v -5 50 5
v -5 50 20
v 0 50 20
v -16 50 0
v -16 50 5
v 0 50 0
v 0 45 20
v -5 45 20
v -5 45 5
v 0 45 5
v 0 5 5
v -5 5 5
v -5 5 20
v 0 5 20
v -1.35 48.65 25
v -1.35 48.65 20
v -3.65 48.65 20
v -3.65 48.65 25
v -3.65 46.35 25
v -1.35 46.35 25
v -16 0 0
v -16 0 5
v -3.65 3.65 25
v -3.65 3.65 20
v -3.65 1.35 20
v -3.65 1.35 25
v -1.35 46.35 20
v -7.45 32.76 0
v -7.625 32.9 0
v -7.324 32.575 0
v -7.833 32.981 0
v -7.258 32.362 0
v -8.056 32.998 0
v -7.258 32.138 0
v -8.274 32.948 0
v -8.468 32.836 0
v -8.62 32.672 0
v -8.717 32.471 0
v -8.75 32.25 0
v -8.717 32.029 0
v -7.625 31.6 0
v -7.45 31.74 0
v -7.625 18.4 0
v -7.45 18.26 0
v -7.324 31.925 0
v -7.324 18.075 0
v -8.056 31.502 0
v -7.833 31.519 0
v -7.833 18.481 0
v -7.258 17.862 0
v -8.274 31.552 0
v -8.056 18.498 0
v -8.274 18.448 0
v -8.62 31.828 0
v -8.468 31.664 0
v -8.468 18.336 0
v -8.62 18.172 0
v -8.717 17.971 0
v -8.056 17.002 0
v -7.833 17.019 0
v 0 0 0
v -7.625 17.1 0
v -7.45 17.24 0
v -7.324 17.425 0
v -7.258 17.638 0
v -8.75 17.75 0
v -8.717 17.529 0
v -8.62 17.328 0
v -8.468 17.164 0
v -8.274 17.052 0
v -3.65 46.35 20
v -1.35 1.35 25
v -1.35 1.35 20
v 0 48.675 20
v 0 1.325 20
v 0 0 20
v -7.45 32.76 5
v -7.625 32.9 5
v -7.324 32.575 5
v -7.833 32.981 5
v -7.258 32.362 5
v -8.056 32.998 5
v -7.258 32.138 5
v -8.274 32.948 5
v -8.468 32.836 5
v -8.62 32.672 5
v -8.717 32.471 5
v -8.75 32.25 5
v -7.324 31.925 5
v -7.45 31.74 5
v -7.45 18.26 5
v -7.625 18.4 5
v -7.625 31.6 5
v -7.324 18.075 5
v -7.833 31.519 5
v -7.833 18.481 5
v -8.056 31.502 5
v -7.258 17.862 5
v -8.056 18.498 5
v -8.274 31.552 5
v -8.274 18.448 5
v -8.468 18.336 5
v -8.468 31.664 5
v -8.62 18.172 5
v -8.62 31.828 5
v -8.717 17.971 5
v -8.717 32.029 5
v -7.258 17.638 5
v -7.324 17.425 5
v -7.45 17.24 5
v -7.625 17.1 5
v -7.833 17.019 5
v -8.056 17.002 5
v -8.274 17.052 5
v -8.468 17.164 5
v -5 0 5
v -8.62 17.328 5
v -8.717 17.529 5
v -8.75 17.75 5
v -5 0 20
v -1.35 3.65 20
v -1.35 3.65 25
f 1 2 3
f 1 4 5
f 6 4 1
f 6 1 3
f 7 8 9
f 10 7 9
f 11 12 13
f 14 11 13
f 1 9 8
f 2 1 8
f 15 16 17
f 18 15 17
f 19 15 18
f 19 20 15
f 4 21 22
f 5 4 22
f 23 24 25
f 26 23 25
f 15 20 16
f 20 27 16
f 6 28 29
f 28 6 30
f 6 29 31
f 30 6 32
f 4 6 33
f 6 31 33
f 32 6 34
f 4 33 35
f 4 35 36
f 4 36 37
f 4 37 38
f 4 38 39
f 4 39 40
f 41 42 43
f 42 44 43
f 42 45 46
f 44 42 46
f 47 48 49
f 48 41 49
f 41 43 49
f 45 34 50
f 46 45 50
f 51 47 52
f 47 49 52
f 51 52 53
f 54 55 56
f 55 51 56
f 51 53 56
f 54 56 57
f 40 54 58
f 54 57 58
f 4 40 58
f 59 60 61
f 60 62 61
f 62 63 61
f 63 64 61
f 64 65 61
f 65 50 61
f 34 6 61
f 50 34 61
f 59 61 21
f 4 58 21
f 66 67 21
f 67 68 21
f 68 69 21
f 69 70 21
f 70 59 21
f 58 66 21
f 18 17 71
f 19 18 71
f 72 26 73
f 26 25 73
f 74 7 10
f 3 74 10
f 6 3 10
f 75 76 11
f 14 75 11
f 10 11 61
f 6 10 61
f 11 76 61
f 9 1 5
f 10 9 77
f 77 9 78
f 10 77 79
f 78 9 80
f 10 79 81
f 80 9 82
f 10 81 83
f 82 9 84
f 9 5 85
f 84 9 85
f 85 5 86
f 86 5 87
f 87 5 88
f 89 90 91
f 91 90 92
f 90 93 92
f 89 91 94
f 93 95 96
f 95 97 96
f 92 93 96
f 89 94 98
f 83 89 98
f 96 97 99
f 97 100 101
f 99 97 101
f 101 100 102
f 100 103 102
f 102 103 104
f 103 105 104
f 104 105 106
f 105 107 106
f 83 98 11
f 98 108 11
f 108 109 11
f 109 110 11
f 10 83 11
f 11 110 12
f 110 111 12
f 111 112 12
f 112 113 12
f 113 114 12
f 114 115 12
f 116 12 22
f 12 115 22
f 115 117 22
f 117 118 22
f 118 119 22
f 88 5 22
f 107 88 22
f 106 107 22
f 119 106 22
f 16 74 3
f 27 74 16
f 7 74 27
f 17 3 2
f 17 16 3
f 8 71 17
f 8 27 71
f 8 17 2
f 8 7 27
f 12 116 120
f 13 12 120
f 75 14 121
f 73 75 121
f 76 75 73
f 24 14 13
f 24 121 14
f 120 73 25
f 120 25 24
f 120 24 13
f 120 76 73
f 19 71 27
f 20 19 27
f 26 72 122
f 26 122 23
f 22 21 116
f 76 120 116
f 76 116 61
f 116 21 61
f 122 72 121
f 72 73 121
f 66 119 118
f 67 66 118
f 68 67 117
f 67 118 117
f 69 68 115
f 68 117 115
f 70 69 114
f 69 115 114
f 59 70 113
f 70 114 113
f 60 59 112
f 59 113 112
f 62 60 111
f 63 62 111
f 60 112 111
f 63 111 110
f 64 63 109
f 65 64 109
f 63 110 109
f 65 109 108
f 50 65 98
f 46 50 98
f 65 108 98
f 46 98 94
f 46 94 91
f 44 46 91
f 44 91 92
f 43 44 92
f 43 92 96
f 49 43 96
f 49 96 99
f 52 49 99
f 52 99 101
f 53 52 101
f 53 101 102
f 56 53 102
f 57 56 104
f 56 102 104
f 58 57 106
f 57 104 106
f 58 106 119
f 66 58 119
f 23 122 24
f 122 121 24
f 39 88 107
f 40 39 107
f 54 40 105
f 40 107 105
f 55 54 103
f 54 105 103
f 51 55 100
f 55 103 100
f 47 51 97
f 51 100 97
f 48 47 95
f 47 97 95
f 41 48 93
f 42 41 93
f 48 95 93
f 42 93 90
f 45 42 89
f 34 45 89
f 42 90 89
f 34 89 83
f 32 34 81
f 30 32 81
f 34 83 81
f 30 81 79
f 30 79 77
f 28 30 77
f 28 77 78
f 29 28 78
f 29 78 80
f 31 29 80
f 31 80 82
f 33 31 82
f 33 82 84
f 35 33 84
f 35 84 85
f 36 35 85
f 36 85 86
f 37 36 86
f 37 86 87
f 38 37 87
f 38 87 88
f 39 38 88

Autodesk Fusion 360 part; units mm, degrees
sketch "Sketch1" plane through (0, 0, 0) normal (0, 0, 1) x (1, 0, 0)
sketch "Sketch2" plane through (0, 0, 0) normal (0, 1, 0) x (1, 0, 0)
  line L0 (0, 0) -> (-16, 0)
  line L1 (-16, 0) -> (-16, -5)
  line L2 (-16, -5) -> (0, -5)
  line L3 (0, -5) -> (0, 0)
  line L4 (0, 0) -> (-5, 0)
  line L5 (-5, 0) -> (-5, -25)
  line L6 (-5, -25) -> (0, -25)
  line L7 (0, -25) -> (0, 0)
  dimension "d1" = 16
  dimension "d2" = 5
  dimension "d3" = 5
  dimension "d4" = 25
extrude "Extrude1" add sketch "Sketch2" along normal blind 50
sketch "Sketch3" plane through (-5, 0, 0) normal (-1, 0, 0) x (0, -1, 0)
  line L0 (0, 5) -> (0, 25)
  line L1 (0, 25) -> (-50, 25)
  line L2 (-50, 25) -> (-50, 5)
  line L3 (-50, 5) -> (0, 5)
  line L4 (-50, 5) -> (-45, 5)
  line L5 (-45, 5) -> (-5, 5)
  line L6 (-5, 5) -> (-5, 20)
  line L7 (-5, 20) -> (-45, 20)
  line L8 (-45, 20) -> (-45, 5)
  dimension "d7" = 5
  dimension "d8" = 40
  dimension "d9" = 15
extrude "Extrude2" cut sketch "Sketch3" against normal blind 1000 contours L3 L5 L6 L7 L8
sketch "Sketch4" plane through (0, 0, 25) normal (0, 0, 1) x (-1, 0, 0)
  line L0 (5, 0) -> (0, 0)
  line L1 (0, 0) -> (0, -50)
  line L2 (0, -50) -> (5, -50)
  line L3 (5, -50) -> (5, 0)
  line L4 (0, -50) -> (0, -48.675)
  line L5 (0, -48.675) -> (1.325, -48.675)
  line L6 (1.325, -48.675) -> (3.625, -48.675)
  line L7 (3.625, -48.675) -> (3.625, -46.375)
  line L8 (3.625, -46.375) -> (1.325, -46.375)
  line L9 (1.325, -46.375) -> (1.325, -48.675)
  line L10 (0, 0) -> (0, -1.325)
  line L11 (0, -1.325) -> (1.325, -1.325)
  line L12 (1.325, -1.325) -> (3.625, -1.325)
  line L13 (3.625, -1.325) -> (3.625, -3.625)
  line L14 (3.625, -3.625) -> (1.325, -3.625)
  line L15 (1.325, -3.625) -> (1.325, -1.325)
  dimension "d12" = 1.325
  dimension "d13" = 1.325
  dimension "d14" = 2.3
  dimension "d15" = 2.3
  dimension "d16" = 1.325
  dimension "d17" = 1.325
  dimension "d18" = 2.3
  dimension "d19" = 2.3
extrude "Extrude3" cut sketch "Sketch4" against normal blind 5
sketch "Sketch5" plane through (0, 0, 5) normal (0, 0, 1) x (-1, 0, 0)
  line L0 (16, 0) -> (5, 0)
  line L1 (5, 0) -> (5, -5)
  line L2 (5, -5) -> (0, -5)
  line L3 (0, -5) -> (0, -45)
  line L4 (0, -45) -> (5, -45)
  line L5 (5, -45) -> (5, -50)
  line L6 (5, -50) -> (16, -50)
  line L7 (16, -50) -> (16, 0)
  line L8 (8, -50) -> (8, -25)
  line L9 (8, -25) -> (8, -32.25)
  line L10 (8, -32.25) -> (8, -17.75)
  line L11 (0, -36) -> (7.25, -36)
  line L12 (7.25, -36) -> (7.25, -31.1746)
  line L13 (8, -32.25) -> (7.25, -32.25)
  line L14 (7.25, -32.25) -> (8, -32.25)
  circle A0 centre (8, -32.25) radius 0.75
  line L15 (8, -32.25) -> (8, -17.75)
  circle A1 centre (8, -17.75) radius 0.75
  dimension "d22" = 25
  dimension "d23" = 7.25
  dimension "d24" = 14.5
  dimension "d25" = 7.25
  dimension "d26" = 0.75
  dimension "d27" = 1.5
  dimension "d28" = 14.5
  dimension "d29" = 1.5
extrude "Extrude4" cut sketch "Sketch5" against normal blind 1000 contours A1 | L8 L13 L14 A0 | L8 L9 L10 A0 L15 | L8 L9 L10 L13 L14 A0 L15
extrude "Extrude5" cut 2 faces at (-2.0917, 47.9083, 25) (-2.0917, 2.8583, 25) along direction (0, 0, -1) blind 5
sketch "Sketch6" plane through (0, 0, 20) normal (0, 0, 1) x (-1, 0, 0)
  line L0 (5, -45) -> (0, -45)
  line L1 (0, -45) -> (0, -50)
  line L2 (0, -50) -> (5, -50)
  line L3 (5, -50) -> (5, -45)
  line L4 (5, 0) -> (3.65, 0)
  line L5 (3.65, 0) -> (3.65, -1.35)
  line L6 (3.65, -1.35) -> (5, -1.35)
  line L7 (5, -1.35) -> (5, 0)
  line L8 (3.65, -1.35) -> (1.35, -1.35)
  line L9 (1.35, -1.35) -> (1.35, -3.65)
  line L10 (1.35, -3.65) -> (3.65, -3.65)
  line L11 (3.65, -3.65) -> (3.65, -1.35)
  line L12 (5, -45) -> (3.65, -45)
  line L13 (3.65, -45) -> (3.65, -46.35)
  line L14 (3.65, -46.35) -> (5, -46.35)
  line L15 (5, -46.35) -> (5, -45)
  line L16 (3.65, -46.35) -> (1.35, -46.35)
  line L17 (1.35, -46.35) -> (1.35, -48.65)
  line L18 (1.35, -48.65) -> (3.65, -48.65)
  line L19 (3.65, -48.65) -> (3.65, -46.35)
  dimension "d34" = 1.35
  dimension "d35" = 1.35
  dimension "d36" = 2.3
  dimension "d37" = 2.3
  dimension "d38" = 1.35
  dimension "d39" = 1.35
  dimension "d40" = 2.3
  dimension "d41" = 2.3
extrude "Extrude6" add sketch "Sketch6" along normal blind 5 contours L16 L17 L18 L19 | L8 L9 L10 L11
